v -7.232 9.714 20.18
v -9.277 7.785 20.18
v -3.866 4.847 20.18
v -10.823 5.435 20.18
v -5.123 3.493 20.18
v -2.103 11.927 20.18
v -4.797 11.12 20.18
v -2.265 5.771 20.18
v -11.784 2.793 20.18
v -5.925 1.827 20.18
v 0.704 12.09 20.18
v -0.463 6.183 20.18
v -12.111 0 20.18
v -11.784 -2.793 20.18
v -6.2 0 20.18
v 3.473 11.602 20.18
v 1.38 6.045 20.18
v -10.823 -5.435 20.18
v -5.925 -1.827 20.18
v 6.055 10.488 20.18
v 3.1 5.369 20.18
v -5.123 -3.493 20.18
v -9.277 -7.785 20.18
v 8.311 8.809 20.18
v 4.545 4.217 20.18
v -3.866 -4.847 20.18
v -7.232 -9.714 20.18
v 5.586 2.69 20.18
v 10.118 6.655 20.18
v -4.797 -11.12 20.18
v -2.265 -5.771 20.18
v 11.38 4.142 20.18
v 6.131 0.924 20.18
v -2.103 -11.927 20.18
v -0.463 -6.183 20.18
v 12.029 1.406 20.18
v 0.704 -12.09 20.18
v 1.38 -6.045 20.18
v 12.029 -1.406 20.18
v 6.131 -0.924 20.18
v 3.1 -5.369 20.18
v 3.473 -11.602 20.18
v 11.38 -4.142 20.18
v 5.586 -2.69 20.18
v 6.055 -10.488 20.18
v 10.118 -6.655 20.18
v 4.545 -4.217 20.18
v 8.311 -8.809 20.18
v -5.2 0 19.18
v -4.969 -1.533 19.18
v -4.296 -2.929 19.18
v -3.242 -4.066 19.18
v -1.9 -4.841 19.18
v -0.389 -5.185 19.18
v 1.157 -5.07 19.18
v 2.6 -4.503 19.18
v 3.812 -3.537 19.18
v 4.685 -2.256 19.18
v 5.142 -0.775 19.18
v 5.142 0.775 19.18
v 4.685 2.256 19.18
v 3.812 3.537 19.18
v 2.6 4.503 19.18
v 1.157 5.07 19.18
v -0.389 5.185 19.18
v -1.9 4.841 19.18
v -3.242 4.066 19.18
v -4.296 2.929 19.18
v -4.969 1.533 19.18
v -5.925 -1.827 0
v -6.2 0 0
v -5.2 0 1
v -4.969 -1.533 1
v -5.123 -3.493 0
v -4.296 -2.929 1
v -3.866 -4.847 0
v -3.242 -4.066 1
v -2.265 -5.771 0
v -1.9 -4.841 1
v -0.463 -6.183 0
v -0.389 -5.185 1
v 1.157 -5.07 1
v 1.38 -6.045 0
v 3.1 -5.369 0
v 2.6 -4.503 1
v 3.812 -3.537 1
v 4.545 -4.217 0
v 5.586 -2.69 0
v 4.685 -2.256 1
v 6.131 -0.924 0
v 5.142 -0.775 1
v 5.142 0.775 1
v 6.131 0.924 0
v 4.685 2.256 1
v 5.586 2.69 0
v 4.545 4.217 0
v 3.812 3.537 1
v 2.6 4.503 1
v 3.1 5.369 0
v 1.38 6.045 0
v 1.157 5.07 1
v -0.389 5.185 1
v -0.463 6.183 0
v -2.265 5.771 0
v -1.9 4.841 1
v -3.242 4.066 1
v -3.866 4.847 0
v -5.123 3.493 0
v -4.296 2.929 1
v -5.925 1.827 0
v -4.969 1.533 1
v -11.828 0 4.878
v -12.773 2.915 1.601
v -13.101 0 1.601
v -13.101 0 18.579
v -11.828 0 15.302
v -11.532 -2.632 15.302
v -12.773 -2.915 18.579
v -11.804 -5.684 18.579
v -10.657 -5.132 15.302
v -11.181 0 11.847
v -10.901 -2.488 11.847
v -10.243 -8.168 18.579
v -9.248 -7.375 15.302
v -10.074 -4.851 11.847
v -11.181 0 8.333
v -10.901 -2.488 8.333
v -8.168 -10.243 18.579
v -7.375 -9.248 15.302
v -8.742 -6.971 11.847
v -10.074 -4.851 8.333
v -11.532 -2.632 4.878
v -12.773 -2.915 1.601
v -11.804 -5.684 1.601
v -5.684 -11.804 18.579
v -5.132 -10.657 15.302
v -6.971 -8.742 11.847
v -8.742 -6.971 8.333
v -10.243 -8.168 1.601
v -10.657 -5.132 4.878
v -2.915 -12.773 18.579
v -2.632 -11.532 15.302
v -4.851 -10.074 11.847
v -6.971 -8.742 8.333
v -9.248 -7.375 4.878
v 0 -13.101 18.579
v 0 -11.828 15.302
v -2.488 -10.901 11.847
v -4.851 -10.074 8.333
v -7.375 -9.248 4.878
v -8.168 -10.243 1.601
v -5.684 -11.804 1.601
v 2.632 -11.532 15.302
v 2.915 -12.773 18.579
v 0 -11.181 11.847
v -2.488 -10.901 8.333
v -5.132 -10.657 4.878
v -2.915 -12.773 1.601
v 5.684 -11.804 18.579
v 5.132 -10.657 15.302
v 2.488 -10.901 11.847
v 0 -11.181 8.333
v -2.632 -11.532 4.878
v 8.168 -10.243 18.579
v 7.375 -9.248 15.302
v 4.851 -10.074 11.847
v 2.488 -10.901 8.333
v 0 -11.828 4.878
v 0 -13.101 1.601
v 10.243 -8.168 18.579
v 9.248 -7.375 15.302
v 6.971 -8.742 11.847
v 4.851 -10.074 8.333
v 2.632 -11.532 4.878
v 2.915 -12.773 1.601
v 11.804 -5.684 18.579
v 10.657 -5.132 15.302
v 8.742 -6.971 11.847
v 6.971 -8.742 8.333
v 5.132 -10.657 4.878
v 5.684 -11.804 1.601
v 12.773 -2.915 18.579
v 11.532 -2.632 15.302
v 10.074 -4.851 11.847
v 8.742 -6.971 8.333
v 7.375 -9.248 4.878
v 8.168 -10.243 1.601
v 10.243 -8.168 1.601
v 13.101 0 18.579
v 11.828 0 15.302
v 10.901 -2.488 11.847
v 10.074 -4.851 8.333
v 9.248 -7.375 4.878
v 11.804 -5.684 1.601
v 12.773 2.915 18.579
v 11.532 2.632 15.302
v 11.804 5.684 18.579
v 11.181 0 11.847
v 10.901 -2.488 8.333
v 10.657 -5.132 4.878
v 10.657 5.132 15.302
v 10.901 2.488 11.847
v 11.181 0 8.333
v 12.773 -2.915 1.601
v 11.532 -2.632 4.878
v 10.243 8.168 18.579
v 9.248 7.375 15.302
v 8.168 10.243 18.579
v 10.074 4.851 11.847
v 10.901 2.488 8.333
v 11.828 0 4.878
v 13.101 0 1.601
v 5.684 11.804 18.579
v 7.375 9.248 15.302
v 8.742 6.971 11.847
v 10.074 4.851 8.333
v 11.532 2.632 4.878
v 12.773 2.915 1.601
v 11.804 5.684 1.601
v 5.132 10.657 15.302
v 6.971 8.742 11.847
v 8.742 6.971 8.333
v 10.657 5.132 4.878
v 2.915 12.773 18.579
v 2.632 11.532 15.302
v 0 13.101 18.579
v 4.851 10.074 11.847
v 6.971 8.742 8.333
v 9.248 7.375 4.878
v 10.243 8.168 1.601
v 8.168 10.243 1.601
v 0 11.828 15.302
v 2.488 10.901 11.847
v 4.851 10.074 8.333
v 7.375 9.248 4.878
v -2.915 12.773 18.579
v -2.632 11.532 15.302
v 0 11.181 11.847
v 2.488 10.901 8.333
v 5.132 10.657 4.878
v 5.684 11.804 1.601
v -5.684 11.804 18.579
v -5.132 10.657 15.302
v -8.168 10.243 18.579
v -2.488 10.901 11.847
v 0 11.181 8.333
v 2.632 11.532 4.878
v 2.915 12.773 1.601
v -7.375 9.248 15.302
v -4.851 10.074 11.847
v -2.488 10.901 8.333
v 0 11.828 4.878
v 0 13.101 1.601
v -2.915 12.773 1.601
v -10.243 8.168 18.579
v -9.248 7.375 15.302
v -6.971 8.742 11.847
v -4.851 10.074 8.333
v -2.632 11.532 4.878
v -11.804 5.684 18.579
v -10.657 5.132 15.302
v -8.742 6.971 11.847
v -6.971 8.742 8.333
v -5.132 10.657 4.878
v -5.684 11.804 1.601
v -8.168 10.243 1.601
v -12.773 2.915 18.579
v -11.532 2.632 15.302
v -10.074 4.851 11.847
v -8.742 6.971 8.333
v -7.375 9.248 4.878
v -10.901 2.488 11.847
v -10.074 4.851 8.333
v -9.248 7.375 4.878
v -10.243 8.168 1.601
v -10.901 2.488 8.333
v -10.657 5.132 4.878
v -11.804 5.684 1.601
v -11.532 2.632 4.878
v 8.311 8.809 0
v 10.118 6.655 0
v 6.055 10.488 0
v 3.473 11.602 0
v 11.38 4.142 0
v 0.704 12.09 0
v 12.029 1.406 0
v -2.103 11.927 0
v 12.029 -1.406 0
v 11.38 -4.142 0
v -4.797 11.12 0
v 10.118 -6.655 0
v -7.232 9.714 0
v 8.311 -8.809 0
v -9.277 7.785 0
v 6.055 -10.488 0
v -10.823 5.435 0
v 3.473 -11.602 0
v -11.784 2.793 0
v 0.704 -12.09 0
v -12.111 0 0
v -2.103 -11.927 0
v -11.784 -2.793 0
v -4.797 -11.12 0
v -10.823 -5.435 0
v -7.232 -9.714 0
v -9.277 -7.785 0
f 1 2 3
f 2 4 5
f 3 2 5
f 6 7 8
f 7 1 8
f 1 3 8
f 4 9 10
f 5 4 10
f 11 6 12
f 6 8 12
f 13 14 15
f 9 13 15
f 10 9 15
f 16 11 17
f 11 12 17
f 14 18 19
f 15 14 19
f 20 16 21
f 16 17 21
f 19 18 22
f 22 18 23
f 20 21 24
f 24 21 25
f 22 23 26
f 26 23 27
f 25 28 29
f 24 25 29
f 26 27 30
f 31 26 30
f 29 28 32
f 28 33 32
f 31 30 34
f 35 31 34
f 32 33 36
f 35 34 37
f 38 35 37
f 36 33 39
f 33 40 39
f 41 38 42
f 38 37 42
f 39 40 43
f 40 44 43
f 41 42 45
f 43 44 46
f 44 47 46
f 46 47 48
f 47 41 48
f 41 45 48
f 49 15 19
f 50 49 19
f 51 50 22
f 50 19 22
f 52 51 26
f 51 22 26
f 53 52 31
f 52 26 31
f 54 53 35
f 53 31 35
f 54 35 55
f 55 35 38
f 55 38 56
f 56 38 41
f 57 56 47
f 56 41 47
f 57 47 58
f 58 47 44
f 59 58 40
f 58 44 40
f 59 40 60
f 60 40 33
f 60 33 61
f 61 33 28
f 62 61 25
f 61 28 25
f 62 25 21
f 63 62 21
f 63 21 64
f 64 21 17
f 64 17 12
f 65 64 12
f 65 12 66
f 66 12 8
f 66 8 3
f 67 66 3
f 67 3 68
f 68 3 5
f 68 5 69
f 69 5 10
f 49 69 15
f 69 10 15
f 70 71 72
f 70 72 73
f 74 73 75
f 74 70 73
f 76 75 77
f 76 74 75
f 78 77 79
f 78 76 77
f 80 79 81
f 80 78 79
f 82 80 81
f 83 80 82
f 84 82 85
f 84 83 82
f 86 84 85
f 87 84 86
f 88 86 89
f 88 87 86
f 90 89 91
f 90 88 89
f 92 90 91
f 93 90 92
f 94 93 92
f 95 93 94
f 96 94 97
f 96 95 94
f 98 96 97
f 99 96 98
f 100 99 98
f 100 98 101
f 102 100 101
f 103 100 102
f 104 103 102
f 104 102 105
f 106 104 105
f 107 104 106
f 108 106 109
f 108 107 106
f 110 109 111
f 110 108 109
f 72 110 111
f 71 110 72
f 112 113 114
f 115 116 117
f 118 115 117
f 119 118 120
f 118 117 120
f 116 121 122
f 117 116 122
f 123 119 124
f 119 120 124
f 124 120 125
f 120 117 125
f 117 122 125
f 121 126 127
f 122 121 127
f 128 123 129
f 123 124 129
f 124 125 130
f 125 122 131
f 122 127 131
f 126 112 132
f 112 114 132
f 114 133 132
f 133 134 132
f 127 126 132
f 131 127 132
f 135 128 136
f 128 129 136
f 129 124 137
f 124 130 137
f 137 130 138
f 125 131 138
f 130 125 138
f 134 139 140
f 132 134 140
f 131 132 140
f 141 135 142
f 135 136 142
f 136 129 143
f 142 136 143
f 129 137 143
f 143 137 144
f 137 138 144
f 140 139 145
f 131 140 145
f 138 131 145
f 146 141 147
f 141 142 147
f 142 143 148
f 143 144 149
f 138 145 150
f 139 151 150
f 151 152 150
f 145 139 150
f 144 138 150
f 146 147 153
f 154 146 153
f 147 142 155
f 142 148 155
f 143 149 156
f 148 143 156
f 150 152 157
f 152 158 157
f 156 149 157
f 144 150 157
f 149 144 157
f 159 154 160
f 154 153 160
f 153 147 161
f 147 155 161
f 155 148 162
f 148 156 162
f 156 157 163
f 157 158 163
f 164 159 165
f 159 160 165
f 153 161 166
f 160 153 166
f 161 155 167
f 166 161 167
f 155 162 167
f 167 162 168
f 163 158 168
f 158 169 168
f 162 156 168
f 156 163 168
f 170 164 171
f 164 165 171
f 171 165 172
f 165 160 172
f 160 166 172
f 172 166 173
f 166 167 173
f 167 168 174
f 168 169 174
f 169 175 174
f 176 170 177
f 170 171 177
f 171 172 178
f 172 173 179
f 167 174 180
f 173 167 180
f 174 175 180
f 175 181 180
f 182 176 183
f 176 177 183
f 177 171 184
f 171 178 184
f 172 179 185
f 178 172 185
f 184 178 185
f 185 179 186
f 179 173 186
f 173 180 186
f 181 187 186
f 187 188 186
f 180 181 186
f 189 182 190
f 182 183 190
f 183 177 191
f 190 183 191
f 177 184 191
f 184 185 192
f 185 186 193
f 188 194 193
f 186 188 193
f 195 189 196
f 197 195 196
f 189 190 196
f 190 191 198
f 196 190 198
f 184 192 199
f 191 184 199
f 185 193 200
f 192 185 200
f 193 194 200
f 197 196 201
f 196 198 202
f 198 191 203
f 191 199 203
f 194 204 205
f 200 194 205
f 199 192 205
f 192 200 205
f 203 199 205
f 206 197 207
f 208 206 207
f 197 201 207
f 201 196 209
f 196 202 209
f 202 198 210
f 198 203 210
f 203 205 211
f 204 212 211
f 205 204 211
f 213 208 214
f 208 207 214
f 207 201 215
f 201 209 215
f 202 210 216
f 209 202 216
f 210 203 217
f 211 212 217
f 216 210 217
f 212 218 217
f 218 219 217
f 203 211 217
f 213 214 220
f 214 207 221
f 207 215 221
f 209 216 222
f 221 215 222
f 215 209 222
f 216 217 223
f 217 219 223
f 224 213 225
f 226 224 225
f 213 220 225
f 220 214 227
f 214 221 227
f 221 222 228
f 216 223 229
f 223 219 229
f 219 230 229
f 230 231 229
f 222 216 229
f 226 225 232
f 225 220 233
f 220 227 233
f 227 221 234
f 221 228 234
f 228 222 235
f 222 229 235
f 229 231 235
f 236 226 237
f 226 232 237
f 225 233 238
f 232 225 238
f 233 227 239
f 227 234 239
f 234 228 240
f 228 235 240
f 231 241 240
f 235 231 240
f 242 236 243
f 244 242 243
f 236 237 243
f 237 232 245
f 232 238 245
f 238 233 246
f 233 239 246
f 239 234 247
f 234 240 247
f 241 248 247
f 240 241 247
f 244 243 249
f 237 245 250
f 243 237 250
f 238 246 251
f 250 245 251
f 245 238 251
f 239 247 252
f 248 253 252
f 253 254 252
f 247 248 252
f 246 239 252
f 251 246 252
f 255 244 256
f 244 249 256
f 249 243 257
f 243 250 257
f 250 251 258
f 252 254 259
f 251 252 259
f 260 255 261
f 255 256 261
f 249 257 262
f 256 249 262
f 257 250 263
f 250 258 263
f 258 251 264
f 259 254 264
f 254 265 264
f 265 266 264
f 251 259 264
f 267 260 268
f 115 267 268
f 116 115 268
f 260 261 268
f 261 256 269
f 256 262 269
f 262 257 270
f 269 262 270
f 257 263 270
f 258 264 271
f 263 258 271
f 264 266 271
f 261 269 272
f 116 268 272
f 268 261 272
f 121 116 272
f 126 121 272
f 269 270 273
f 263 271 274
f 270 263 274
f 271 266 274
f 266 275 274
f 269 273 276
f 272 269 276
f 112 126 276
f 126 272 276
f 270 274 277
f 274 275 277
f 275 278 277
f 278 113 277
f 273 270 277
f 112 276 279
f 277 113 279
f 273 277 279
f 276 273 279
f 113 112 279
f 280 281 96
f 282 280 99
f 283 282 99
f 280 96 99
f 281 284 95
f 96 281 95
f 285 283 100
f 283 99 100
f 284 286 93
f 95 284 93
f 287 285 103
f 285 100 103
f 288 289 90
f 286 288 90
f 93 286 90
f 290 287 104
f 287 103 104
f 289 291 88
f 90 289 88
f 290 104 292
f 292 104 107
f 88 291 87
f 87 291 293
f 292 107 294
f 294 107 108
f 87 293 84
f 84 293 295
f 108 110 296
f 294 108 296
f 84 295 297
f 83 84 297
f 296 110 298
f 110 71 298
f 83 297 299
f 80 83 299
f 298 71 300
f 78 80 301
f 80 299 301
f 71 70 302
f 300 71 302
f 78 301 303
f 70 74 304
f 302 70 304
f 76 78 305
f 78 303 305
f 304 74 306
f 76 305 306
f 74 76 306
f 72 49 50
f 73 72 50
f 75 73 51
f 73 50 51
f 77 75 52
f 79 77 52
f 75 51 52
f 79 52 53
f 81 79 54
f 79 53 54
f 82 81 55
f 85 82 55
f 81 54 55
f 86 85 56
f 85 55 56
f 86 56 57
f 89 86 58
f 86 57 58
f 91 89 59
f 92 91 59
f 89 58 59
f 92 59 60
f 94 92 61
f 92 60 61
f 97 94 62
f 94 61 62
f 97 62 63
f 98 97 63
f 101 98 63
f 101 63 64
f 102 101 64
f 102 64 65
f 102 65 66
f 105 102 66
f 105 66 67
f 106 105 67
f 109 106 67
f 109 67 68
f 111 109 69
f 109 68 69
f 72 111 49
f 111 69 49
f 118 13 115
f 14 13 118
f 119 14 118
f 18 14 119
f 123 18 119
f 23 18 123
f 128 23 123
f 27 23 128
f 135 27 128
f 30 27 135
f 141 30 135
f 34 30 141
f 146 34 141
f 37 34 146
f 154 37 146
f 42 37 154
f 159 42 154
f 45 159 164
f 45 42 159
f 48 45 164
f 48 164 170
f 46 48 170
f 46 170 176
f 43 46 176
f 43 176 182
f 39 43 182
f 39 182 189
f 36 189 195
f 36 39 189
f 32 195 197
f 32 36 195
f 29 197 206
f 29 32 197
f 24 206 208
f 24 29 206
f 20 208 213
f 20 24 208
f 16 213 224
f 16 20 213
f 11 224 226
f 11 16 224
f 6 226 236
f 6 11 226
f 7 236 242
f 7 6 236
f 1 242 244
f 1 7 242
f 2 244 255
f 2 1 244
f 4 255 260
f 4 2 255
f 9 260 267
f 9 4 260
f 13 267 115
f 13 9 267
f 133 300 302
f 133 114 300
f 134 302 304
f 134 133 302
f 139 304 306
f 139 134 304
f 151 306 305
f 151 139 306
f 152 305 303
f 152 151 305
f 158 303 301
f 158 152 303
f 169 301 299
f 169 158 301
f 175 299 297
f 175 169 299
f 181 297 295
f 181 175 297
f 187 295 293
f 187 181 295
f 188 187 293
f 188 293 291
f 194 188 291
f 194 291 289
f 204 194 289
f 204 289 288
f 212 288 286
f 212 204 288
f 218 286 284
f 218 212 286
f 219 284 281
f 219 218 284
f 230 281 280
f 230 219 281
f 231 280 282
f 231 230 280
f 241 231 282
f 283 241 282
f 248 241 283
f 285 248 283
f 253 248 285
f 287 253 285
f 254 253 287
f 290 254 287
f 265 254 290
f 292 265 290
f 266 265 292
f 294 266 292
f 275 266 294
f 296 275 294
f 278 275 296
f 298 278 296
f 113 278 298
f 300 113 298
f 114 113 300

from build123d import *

# Parameters (mm, degrees)
F2_SIZE = 1


# Not quite as in the source:
# - a fillet or chamfer that OpenCascade refuses, or shapes differently, is made with other operations: its cross-section is extruded or revolved along the edge and cut away or added


with BuildPart() as f1:
    # F0 (on Front) → F1 (revolve)
    with BuildSketch(Plane.XZ):
        with BuildLine():
            Line((-5.2, 0), (-5.2, 20.18))
            Line((-5.2, 20.18), (-14, 20.18))
            ThreePointArc((-14, 20.18), (-11.0994378784, 10.09), (-14, 0))
            Line((-14, 0), (-5.2, 0))
        make_face()
    revolve(axis=Axis((0, 0, 10.09), (0, 0, 1)))

    # F2
    f2_edges = [f1.edges().sort_by_distance(p)[0] for p in [
        (5.2, 0, 0),
        (5.2, 0, 20.18),
        (-5.2, 0, 10.09),
    ]]
    chamfer(f2_edges, length=F2_SIZE)

    # F3: chamfer of 2 on 3 edges, made by hand

    # F3_s1 → F3_t2 (revolve, cut)
    with BuildSketch(Plane.XZ):
        with BuildLine():
            Line((-13.1431767576, 18.5105716839), (-12.0687646644, 20.2480416136))
            Line((-12.0687646644, 20.2480416136), (-12.0687646644, 20.2880416136))
            ThreePointArc((-12.0687646644, 20.2880416136), (-13.0343823322, 20.22), (-14, 20.22))
            Line((-14, 20.22), (-14.0338935534, 20.1587578947))
            ThreePointArc((-14.0338935534, 20.1587578947), (-13.556591594, 19.3536837603), (-13.1789627292, 18.4927009191))
            Line((-13.1789627292, 18.4927009191), (-13.1431767576, 18.5105716839))
        make_face()
    revolve(axis=Axis((0, 0, 20.18), (0, 0, 1)), mode=Mode.SUBTRACT)

    # F3_s3 → F3_t4 (revolve, cut)
    with BuildSketch(Plane.XZ):
        with BuildLine():
            Line((-12.0687646644, -0.0680416136), (-13.1431767576, 1.6694283161))
            Line((-13.1431767576, 1.6694283161), (-13.1789627292, 1.6872990809))
            ThreePointArc((-13.1789627292, 1.6872990809), (-13.556591594, 0.8263162397), (-14.0338935534, 0.0212421053))
            Line((-14.0338935534, 0.0212421053), (-14, -0.04))
            ThreePointArc((-14, -0.04), (-13.0343823322, -0.04), (-12.0687646644, -0.1080416136))
            Line((-12.0687646644, -0.1080416136), (-12.0687646644, -0.0680416136))
        make_face()
    revolve(axis=Axis((0, 0, 0), (0, 0, 1)), mode=Mode.SUBTRACT)


solid = f1.part
